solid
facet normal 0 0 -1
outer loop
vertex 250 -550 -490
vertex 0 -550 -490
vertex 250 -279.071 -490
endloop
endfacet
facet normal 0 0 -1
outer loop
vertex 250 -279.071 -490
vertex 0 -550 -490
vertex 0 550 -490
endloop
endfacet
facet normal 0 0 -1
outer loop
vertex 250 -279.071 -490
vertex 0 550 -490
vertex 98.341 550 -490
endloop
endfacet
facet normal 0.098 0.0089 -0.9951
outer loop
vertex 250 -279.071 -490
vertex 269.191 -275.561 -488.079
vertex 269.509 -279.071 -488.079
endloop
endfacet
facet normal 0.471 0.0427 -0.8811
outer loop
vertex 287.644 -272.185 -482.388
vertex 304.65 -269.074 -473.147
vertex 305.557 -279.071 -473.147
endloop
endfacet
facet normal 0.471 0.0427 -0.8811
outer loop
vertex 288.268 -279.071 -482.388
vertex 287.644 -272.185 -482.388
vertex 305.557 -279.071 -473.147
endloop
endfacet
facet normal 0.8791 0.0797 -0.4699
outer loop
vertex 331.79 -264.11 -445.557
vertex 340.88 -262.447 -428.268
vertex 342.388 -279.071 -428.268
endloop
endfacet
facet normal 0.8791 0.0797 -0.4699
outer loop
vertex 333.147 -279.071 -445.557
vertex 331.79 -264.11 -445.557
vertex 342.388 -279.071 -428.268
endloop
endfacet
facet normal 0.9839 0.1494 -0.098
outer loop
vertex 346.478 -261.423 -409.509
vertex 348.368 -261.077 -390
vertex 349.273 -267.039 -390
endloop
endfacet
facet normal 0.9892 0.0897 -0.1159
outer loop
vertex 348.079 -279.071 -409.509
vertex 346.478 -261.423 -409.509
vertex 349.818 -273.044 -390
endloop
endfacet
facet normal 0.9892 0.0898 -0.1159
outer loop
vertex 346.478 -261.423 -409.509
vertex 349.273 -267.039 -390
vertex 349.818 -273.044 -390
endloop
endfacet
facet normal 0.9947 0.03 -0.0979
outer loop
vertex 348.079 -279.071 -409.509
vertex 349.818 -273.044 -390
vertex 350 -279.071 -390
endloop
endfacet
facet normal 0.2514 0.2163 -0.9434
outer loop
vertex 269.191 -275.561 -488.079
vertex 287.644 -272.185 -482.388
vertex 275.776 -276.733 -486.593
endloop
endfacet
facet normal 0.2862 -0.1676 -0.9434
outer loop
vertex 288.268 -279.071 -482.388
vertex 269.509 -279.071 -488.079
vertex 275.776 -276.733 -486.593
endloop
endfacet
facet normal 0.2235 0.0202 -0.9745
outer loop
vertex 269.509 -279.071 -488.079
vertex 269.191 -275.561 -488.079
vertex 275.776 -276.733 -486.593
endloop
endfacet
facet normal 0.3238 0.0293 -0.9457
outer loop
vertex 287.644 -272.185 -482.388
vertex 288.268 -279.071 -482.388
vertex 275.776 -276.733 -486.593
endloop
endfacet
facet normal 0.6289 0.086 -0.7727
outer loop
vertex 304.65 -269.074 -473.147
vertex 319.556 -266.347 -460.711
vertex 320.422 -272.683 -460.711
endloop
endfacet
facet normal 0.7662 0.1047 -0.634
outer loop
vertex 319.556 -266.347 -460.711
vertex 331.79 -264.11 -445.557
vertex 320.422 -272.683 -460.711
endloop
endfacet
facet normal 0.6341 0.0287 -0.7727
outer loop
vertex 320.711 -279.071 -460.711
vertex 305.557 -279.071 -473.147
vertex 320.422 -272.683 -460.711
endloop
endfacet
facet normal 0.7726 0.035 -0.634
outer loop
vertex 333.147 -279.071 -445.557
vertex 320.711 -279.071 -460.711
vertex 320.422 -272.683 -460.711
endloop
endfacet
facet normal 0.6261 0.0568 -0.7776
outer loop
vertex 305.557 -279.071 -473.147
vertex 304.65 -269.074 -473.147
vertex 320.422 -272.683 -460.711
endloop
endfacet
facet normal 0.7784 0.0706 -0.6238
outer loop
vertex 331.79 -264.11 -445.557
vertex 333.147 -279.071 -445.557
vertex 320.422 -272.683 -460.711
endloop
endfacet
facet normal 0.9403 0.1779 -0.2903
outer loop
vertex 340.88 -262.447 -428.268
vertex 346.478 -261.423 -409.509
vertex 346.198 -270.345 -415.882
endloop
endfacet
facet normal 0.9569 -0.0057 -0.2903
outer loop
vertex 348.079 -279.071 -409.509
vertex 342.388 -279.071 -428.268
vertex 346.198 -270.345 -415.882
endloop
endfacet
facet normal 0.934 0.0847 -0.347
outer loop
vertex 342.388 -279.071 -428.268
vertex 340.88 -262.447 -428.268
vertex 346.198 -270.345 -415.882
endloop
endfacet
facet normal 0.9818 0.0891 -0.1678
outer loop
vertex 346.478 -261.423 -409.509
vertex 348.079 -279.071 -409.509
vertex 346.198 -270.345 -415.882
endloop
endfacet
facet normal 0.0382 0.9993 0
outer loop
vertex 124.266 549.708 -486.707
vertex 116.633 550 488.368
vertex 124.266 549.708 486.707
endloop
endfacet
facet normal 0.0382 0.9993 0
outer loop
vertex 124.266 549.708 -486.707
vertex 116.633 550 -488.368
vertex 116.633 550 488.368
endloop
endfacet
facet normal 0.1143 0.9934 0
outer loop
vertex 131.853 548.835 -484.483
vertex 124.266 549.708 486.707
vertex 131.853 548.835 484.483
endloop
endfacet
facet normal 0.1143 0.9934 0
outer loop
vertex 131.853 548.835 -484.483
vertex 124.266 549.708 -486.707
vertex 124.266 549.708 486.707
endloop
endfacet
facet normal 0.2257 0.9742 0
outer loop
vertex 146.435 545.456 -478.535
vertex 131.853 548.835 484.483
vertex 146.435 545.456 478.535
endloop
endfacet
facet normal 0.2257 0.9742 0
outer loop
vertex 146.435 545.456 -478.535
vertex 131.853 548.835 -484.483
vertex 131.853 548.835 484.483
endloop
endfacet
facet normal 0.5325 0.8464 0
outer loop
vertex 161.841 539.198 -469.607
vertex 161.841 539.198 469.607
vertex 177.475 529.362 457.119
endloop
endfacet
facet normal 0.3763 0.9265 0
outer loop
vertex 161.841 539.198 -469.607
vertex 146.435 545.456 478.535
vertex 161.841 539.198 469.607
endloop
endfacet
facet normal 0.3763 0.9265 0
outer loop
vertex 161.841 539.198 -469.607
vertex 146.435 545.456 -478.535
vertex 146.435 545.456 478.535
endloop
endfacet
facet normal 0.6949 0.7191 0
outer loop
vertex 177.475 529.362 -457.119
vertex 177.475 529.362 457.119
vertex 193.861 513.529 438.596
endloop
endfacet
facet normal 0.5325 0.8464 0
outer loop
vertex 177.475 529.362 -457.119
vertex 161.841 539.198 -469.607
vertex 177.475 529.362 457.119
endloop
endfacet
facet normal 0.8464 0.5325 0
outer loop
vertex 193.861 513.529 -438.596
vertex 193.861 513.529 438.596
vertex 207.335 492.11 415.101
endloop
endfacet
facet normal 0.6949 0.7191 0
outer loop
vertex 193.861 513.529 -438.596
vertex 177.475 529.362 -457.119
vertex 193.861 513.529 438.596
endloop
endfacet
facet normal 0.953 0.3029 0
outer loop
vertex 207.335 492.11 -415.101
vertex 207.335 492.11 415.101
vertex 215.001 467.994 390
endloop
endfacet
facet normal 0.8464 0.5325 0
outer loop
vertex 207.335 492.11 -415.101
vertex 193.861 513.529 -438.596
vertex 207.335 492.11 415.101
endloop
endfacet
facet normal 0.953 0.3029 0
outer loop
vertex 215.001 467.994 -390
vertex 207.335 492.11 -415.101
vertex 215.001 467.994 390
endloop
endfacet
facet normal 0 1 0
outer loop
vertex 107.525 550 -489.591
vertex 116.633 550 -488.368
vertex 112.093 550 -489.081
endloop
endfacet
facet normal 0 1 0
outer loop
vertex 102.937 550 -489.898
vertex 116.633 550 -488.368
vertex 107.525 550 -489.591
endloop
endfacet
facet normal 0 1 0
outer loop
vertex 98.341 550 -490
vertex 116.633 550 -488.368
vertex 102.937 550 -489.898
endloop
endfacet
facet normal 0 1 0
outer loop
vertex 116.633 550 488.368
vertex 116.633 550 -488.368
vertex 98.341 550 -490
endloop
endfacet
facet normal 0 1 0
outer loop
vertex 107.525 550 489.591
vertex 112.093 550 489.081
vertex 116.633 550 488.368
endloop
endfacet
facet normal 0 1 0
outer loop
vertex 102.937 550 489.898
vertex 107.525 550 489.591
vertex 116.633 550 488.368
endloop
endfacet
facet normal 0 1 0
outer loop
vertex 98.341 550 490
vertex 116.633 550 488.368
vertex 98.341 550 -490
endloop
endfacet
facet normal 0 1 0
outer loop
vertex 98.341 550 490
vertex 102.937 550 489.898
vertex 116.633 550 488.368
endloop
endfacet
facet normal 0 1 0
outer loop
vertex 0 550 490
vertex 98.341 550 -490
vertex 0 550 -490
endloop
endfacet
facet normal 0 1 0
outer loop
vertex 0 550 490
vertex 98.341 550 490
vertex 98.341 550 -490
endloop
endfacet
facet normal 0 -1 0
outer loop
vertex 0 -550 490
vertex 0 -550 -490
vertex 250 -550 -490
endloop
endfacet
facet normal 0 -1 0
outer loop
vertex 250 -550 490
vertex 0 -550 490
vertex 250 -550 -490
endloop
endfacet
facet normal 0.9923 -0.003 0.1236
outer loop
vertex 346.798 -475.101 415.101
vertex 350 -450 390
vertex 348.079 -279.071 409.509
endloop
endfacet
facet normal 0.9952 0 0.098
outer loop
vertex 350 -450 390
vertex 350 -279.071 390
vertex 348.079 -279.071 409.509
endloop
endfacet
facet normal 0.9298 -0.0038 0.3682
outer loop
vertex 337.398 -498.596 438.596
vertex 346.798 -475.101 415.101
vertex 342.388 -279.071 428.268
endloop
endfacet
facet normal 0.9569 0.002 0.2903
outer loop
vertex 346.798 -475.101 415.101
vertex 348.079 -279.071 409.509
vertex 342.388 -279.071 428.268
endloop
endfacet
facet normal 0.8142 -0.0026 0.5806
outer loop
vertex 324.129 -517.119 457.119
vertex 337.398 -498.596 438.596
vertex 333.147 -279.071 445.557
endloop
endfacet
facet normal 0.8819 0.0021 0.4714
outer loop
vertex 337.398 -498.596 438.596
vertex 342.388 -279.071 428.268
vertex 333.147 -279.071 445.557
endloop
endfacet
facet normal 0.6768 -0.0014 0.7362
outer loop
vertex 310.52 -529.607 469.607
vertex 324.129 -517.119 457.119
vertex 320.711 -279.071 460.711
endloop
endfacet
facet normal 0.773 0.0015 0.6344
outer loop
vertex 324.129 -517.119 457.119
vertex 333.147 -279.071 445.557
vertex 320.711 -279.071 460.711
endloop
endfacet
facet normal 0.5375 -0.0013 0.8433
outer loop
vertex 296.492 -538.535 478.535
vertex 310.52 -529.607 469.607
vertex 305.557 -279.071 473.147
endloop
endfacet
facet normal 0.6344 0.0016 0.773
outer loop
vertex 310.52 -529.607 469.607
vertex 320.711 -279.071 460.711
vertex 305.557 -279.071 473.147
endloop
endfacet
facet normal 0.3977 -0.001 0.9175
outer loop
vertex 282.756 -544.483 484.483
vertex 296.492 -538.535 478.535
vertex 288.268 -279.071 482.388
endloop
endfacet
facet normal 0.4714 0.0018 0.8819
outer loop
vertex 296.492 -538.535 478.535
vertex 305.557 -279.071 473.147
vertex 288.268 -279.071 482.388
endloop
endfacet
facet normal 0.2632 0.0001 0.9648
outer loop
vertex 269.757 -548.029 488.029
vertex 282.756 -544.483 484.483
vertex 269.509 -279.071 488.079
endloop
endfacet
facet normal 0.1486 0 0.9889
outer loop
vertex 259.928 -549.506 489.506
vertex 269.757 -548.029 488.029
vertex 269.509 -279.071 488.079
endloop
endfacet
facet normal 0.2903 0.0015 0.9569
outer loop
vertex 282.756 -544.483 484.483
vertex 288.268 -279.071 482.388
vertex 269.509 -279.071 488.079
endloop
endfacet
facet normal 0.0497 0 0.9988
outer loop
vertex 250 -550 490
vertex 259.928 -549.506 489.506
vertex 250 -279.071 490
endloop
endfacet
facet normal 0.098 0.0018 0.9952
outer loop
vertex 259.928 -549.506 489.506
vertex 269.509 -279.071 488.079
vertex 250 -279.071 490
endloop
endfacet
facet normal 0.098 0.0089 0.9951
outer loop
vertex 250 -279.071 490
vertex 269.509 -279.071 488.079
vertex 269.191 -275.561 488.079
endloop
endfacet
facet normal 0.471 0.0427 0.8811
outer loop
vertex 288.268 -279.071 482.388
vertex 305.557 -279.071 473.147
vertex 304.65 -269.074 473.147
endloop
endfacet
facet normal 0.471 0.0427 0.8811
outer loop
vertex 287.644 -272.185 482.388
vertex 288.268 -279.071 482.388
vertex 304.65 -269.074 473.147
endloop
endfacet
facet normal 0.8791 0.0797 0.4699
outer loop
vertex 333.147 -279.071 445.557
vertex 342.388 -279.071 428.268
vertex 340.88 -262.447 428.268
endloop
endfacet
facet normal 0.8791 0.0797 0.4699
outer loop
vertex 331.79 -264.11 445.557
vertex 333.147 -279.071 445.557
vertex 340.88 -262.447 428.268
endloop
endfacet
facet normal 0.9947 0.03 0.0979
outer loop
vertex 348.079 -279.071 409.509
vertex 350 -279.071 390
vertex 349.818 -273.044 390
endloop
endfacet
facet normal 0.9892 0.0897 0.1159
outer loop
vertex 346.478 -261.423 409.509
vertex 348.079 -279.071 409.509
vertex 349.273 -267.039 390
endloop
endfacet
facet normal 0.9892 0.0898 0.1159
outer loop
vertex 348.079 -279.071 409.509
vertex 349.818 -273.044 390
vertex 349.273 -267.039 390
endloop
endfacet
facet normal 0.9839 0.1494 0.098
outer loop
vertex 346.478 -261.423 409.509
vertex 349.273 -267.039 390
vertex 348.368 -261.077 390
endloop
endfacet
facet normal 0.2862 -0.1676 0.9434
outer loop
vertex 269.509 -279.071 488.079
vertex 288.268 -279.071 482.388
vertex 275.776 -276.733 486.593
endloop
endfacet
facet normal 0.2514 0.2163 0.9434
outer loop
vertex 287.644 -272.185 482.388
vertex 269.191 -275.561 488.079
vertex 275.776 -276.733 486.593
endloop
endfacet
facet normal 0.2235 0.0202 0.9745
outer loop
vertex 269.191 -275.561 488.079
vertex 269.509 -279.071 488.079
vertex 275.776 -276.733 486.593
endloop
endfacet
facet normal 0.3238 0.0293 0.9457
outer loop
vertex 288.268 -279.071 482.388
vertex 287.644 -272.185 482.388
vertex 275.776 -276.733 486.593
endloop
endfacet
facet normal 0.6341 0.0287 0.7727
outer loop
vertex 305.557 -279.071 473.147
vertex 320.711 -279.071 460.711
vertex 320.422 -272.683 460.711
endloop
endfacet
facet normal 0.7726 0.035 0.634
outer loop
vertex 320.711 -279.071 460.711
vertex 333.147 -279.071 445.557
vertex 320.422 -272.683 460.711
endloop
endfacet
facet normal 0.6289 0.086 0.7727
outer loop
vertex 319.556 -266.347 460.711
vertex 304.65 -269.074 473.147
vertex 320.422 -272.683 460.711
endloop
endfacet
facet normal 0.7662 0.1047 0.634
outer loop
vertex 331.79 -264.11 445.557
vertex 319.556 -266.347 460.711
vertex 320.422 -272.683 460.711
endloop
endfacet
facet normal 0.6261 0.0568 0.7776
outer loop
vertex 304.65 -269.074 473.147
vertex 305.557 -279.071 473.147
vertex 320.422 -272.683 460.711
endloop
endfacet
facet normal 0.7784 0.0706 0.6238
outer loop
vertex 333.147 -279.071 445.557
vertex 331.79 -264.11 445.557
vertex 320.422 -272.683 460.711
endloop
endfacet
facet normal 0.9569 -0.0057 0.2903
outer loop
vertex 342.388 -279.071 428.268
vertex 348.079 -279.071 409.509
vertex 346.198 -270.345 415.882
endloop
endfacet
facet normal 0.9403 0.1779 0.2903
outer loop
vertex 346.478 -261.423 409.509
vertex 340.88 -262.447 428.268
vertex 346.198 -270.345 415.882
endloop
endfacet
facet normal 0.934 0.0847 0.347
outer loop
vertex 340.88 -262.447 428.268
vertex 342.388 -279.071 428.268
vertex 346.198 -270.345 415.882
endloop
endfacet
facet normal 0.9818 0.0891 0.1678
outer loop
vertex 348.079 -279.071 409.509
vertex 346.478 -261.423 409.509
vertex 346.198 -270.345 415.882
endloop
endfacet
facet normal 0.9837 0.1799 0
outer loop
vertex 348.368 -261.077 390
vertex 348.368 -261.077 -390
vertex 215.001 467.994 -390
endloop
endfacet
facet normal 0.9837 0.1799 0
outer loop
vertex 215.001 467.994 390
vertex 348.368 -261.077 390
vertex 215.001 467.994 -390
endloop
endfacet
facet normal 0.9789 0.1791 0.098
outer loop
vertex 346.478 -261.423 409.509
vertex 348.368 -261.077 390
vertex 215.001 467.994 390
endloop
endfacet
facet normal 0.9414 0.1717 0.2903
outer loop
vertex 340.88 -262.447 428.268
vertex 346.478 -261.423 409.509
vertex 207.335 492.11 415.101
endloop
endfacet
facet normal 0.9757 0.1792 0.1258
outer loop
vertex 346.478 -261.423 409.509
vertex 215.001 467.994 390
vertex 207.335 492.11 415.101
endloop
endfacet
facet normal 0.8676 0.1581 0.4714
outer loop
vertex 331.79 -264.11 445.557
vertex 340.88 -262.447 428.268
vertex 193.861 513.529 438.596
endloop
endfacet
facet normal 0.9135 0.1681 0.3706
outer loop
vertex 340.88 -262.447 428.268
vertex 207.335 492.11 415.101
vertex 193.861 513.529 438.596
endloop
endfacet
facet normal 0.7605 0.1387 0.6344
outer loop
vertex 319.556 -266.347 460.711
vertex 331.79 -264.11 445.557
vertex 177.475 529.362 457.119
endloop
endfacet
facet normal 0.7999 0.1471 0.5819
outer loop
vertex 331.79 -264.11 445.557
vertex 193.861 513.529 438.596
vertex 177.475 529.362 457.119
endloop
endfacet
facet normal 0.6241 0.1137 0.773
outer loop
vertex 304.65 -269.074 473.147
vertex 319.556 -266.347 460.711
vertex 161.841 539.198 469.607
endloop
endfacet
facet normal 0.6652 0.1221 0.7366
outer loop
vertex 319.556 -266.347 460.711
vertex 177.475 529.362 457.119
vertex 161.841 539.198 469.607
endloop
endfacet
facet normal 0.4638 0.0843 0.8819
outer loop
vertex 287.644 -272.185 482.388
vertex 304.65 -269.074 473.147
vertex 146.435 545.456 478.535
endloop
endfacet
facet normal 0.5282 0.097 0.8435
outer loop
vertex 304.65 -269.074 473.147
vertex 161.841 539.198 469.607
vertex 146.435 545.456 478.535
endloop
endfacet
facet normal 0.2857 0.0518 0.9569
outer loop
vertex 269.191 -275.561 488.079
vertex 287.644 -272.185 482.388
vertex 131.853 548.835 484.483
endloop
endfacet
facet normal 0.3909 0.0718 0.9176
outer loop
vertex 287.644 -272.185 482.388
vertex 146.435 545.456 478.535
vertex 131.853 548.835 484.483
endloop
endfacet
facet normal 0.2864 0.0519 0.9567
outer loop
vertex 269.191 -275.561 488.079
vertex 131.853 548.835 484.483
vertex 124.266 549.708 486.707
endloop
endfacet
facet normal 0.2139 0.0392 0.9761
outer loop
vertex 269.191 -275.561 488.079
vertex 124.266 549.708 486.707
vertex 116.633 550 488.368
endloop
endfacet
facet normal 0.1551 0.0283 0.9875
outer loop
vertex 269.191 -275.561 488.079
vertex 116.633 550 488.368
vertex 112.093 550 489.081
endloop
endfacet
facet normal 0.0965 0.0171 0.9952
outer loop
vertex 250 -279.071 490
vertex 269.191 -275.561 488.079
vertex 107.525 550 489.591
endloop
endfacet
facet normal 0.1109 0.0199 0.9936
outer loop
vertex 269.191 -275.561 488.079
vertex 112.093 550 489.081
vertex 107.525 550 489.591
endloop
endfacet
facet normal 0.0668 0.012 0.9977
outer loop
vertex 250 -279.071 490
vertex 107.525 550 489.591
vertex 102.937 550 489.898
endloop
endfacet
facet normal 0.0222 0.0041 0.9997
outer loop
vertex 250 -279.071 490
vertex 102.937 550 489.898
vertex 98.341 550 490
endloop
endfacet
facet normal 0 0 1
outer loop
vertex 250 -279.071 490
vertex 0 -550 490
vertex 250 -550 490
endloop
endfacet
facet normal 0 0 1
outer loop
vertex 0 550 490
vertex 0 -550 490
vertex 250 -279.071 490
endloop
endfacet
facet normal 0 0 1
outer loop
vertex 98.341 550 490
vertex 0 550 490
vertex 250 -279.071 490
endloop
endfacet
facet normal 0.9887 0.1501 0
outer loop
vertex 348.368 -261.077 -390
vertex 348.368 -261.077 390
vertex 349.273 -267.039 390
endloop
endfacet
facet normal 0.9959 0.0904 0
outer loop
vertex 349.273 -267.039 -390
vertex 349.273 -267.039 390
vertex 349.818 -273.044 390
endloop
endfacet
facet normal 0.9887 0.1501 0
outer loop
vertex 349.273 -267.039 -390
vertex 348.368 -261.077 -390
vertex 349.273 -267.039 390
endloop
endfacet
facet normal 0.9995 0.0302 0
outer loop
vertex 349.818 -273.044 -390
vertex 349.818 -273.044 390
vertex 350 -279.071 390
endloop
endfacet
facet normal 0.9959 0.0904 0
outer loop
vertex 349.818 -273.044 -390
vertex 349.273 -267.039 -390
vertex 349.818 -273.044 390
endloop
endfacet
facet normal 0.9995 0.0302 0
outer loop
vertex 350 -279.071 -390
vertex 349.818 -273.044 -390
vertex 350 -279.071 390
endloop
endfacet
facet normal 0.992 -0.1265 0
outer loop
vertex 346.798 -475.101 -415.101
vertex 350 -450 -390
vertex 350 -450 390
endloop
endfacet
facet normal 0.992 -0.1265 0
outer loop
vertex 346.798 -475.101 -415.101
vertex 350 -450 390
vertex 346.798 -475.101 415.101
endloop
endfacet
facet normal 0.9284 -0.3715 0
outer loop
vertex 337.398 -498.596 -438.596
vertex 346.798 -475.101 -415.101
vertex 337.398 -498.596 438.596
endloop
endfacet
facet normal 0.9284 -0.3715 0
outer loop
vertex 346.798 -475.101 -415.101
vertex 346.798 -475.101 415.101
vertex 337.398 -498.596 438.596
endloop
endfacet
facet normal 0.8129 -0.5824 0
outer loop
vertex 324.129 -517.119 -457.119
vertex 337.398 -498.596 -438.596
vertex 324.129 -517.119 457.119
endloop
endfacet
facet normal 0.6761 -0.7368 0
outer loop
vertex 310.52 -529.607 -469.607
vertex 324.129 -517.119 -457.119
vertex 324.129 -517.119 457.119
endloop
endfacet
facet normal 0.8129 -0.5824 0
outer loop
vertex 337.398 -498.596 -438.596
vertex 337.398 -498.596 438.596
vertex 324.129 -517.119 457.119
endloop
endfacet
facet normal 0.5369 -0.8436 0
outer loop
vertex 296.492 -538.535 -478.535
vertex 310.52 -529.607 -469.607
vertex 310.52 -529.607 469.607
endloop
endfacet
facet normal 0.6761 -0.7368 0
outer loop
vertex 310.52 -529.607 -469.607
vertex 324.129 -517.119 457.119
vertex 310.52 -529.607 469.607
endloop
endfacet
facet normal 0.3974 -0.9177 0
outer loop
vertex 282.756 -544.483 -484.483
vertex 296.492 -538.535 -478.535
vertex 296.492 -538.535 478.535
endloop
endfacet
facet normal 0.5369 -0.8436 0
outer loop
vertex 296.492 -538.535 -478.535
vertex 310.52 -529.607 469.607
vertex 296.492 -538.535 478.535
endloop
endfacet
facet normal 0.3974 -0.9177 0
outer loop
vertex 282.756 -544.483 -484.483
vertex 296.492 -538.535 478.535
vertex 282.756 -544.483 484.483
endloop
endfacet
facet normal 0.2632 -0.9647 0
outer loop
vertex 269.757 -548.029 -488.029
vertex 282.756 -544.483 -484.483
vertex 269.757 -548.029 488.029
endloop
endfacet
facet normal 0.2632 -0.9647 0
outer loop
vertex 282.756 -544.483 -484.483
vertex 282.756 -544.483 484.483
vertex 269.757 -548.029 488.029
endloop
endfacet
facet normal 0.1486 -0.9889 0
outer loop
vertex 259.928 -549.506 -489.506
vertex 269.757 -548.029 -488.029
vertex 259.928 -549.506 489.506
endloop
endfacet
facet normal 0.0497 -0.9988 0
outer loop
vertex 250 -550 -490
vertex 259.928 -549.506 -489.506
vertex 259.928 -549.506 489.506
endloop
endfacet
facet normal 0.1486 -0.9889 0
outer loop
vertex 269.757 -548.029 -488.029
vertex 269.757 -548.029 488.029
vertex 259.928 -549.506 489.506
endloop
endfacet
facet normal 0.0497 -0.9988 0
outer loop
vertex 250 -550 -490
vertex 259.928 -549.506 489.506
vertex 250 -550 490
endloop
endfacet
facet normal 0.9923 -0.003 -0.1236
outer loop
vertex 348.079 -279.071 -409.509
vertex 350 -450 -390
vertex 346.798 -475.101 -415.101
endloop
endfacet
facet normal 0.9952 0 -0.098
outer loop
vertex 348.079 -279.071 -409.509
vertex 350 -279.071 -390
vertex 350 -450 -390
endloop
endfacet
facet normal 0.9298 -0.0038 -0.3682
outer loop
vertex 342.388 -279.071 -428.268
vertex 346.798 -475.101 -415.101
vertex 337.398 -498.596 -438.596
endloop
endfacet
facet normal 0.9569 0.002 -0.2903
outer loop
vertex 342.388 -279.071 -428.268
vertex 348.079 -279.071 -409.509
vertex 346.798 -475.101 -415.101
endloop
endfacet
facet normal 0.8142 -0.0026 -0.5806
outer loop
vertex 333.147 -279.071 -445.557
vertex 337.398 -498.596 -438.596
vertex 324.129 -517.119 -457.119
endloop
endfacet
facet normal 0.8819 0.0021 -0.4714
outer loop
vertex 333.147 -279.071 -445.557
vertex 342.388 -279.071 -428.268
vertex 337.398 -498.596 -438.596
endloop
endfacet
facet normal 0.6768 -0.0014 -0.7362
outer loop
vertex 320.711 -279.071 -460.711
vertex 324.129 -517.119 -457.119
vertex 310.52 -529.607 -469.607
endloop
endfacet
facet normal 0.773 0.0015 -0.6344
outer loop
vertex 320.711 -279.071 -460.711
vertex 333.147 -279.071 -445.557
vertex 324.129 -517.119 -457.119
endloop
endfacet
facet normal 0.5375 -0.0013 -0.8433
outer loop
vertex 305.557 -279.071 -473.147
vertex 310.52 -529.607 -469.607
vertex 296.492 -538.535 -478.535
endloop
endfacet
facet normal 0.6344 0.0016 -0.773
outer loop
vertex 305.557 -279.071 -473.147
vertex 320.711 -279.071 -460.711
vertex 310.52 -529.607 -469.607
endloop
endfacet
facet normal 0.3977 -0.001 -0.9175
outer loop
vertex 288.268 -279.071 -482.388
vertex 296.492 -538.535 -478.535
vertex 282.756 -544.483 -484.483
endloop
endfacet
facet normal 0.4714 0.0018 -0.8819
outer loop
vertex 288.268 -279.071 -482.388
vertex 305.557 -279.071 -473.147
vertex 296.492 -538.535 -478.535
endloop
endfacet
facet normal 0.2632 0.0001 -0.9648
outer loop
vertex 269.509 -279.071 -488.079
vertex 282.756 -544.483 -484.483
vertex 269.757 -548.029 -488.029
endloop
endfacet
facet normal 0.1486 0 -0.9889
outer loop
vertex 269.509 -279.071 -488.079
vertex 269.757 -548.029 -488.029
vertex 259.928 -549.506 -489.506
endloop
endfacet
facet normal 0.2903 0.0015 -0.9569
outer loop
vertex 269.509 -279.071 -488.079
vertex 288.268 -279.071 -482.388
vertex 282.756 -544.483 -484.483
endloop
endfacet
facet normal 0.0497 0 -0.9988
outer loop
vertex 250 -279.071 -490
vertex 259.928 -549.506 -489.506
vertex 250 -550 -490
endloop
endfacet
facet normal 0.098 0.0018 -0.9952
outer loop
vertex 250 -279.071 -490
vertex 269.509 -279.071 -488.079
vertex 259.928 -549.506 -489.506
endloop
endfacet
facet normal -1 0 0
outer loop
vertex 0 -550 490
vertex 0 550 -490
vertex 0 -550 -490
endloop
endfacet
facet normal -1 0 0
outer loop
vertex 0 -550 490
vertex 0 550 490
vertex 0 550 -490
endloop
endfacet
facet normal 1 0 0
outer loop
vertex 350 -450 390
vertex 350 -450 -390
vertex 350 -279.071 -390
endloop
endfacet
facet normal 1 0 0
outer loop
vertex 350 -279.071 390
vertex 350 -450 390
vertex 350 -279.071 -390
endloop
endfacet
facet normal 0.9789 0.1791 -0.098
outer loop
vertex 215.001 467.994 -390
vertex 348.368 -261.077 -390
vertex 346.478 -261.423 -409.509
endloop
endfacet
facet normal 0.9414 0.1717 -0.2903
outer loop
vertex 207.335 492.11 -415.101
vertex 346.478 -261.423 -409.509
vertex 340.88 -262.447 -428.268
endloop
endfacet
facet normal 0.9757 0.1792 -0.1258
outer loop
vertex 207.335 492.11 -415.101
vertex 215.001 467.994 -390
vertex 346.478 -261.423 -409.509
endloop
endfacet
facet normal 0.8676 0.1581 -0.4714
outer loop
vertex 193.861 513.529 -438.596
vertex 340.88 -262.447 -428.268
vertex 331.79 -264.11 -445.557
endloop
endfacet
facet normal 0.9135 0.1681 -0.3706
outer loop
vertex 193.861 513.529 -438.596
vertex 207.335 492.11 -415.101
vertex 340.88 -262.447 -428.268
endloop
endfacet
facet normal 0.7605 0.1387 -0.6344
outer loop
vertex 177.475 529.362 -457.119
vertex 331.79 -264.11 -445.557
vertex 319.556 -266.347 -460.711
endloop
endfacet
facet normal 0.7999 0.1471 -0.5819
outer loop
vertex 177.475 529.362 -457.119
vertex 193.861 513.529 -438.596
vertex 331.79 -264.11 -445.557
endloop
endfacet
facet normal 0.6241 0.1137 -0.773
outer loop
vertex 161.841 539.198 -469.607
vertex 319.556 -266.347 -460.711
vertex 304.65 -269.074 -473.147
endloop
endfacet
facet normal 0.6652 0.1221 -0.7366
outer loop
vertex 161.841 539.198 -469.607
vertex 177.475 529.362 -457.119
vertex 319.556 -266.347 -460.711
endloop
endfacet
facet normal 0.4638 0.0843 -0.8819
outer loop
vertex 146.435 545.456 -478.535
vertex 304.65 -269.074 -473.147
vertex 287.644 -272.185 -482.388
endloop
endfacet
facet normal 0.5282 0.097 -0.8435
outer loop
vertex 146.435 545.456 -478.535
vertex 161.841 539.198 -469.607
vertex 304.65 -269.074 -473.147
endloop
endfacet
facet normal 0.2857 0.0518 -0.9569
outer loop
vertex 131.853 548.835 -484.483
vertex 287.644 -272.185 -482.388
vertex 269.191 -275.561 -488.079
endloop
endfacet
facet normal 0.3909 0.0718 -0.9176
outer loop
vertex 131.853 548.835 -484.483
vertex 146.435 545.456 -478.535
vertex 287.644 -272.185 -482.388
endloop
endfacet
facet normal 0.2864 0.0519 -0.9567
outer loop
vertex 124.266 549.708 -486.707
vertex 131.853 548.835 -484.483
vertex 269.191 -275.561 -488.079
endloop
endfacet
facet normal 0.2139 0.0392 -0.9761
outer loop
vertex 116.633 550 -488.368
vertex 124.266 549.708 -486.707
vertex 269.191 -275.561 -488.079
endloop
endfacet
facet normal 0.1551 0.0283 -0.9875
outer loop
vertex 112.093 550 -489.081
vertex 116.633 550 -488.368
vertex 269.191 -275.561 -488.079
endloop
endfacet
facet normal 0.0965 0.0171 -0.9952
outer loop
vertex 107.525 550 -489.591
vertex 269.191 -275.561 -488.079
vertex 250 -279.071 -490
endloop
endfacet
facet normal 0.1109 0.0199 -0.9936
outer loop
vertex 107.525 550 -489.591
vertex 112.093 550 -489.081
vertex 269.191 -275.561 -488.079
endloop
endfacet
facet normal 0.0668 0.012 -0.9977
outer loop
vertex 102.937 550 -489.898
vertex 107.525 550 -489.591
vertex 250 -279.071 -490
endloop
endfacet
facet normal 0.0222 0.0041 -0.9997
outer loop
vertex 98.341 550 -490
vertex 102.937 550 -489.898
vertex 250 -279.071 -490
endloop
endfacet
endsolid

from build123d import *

# Parameters (mm, degrees)
BOSS_EXTRUDE1_DEPTH = 490
FILLET1_R           = 100


with BuildPart() as part:
    # Sketch1 → Boss-Extrude1 (new, symmetric)
    with BuildSketch(Plane.XY):
        Polygon((0, 550), (0, -550), (350, -550), (350, -270), (200, 550), align=None)
    extrude(amount=BOSS_EXTRUDE1_DEPTH, both=True)

    # Fillet1
    fillet1_edges = [part.edges().sort_by_distance(p)[0] for p in [
        (350, -410, 490),
        (275, 140, 490),
        (275, 140, -490),
        (350, -410, -490),
        (200, 550, 0),
        (350, -270, 0),
        (350, -550, 0),
    ]]
    fillet(fillet1_edges, radius=FILLET1_R)


solid = part.part
